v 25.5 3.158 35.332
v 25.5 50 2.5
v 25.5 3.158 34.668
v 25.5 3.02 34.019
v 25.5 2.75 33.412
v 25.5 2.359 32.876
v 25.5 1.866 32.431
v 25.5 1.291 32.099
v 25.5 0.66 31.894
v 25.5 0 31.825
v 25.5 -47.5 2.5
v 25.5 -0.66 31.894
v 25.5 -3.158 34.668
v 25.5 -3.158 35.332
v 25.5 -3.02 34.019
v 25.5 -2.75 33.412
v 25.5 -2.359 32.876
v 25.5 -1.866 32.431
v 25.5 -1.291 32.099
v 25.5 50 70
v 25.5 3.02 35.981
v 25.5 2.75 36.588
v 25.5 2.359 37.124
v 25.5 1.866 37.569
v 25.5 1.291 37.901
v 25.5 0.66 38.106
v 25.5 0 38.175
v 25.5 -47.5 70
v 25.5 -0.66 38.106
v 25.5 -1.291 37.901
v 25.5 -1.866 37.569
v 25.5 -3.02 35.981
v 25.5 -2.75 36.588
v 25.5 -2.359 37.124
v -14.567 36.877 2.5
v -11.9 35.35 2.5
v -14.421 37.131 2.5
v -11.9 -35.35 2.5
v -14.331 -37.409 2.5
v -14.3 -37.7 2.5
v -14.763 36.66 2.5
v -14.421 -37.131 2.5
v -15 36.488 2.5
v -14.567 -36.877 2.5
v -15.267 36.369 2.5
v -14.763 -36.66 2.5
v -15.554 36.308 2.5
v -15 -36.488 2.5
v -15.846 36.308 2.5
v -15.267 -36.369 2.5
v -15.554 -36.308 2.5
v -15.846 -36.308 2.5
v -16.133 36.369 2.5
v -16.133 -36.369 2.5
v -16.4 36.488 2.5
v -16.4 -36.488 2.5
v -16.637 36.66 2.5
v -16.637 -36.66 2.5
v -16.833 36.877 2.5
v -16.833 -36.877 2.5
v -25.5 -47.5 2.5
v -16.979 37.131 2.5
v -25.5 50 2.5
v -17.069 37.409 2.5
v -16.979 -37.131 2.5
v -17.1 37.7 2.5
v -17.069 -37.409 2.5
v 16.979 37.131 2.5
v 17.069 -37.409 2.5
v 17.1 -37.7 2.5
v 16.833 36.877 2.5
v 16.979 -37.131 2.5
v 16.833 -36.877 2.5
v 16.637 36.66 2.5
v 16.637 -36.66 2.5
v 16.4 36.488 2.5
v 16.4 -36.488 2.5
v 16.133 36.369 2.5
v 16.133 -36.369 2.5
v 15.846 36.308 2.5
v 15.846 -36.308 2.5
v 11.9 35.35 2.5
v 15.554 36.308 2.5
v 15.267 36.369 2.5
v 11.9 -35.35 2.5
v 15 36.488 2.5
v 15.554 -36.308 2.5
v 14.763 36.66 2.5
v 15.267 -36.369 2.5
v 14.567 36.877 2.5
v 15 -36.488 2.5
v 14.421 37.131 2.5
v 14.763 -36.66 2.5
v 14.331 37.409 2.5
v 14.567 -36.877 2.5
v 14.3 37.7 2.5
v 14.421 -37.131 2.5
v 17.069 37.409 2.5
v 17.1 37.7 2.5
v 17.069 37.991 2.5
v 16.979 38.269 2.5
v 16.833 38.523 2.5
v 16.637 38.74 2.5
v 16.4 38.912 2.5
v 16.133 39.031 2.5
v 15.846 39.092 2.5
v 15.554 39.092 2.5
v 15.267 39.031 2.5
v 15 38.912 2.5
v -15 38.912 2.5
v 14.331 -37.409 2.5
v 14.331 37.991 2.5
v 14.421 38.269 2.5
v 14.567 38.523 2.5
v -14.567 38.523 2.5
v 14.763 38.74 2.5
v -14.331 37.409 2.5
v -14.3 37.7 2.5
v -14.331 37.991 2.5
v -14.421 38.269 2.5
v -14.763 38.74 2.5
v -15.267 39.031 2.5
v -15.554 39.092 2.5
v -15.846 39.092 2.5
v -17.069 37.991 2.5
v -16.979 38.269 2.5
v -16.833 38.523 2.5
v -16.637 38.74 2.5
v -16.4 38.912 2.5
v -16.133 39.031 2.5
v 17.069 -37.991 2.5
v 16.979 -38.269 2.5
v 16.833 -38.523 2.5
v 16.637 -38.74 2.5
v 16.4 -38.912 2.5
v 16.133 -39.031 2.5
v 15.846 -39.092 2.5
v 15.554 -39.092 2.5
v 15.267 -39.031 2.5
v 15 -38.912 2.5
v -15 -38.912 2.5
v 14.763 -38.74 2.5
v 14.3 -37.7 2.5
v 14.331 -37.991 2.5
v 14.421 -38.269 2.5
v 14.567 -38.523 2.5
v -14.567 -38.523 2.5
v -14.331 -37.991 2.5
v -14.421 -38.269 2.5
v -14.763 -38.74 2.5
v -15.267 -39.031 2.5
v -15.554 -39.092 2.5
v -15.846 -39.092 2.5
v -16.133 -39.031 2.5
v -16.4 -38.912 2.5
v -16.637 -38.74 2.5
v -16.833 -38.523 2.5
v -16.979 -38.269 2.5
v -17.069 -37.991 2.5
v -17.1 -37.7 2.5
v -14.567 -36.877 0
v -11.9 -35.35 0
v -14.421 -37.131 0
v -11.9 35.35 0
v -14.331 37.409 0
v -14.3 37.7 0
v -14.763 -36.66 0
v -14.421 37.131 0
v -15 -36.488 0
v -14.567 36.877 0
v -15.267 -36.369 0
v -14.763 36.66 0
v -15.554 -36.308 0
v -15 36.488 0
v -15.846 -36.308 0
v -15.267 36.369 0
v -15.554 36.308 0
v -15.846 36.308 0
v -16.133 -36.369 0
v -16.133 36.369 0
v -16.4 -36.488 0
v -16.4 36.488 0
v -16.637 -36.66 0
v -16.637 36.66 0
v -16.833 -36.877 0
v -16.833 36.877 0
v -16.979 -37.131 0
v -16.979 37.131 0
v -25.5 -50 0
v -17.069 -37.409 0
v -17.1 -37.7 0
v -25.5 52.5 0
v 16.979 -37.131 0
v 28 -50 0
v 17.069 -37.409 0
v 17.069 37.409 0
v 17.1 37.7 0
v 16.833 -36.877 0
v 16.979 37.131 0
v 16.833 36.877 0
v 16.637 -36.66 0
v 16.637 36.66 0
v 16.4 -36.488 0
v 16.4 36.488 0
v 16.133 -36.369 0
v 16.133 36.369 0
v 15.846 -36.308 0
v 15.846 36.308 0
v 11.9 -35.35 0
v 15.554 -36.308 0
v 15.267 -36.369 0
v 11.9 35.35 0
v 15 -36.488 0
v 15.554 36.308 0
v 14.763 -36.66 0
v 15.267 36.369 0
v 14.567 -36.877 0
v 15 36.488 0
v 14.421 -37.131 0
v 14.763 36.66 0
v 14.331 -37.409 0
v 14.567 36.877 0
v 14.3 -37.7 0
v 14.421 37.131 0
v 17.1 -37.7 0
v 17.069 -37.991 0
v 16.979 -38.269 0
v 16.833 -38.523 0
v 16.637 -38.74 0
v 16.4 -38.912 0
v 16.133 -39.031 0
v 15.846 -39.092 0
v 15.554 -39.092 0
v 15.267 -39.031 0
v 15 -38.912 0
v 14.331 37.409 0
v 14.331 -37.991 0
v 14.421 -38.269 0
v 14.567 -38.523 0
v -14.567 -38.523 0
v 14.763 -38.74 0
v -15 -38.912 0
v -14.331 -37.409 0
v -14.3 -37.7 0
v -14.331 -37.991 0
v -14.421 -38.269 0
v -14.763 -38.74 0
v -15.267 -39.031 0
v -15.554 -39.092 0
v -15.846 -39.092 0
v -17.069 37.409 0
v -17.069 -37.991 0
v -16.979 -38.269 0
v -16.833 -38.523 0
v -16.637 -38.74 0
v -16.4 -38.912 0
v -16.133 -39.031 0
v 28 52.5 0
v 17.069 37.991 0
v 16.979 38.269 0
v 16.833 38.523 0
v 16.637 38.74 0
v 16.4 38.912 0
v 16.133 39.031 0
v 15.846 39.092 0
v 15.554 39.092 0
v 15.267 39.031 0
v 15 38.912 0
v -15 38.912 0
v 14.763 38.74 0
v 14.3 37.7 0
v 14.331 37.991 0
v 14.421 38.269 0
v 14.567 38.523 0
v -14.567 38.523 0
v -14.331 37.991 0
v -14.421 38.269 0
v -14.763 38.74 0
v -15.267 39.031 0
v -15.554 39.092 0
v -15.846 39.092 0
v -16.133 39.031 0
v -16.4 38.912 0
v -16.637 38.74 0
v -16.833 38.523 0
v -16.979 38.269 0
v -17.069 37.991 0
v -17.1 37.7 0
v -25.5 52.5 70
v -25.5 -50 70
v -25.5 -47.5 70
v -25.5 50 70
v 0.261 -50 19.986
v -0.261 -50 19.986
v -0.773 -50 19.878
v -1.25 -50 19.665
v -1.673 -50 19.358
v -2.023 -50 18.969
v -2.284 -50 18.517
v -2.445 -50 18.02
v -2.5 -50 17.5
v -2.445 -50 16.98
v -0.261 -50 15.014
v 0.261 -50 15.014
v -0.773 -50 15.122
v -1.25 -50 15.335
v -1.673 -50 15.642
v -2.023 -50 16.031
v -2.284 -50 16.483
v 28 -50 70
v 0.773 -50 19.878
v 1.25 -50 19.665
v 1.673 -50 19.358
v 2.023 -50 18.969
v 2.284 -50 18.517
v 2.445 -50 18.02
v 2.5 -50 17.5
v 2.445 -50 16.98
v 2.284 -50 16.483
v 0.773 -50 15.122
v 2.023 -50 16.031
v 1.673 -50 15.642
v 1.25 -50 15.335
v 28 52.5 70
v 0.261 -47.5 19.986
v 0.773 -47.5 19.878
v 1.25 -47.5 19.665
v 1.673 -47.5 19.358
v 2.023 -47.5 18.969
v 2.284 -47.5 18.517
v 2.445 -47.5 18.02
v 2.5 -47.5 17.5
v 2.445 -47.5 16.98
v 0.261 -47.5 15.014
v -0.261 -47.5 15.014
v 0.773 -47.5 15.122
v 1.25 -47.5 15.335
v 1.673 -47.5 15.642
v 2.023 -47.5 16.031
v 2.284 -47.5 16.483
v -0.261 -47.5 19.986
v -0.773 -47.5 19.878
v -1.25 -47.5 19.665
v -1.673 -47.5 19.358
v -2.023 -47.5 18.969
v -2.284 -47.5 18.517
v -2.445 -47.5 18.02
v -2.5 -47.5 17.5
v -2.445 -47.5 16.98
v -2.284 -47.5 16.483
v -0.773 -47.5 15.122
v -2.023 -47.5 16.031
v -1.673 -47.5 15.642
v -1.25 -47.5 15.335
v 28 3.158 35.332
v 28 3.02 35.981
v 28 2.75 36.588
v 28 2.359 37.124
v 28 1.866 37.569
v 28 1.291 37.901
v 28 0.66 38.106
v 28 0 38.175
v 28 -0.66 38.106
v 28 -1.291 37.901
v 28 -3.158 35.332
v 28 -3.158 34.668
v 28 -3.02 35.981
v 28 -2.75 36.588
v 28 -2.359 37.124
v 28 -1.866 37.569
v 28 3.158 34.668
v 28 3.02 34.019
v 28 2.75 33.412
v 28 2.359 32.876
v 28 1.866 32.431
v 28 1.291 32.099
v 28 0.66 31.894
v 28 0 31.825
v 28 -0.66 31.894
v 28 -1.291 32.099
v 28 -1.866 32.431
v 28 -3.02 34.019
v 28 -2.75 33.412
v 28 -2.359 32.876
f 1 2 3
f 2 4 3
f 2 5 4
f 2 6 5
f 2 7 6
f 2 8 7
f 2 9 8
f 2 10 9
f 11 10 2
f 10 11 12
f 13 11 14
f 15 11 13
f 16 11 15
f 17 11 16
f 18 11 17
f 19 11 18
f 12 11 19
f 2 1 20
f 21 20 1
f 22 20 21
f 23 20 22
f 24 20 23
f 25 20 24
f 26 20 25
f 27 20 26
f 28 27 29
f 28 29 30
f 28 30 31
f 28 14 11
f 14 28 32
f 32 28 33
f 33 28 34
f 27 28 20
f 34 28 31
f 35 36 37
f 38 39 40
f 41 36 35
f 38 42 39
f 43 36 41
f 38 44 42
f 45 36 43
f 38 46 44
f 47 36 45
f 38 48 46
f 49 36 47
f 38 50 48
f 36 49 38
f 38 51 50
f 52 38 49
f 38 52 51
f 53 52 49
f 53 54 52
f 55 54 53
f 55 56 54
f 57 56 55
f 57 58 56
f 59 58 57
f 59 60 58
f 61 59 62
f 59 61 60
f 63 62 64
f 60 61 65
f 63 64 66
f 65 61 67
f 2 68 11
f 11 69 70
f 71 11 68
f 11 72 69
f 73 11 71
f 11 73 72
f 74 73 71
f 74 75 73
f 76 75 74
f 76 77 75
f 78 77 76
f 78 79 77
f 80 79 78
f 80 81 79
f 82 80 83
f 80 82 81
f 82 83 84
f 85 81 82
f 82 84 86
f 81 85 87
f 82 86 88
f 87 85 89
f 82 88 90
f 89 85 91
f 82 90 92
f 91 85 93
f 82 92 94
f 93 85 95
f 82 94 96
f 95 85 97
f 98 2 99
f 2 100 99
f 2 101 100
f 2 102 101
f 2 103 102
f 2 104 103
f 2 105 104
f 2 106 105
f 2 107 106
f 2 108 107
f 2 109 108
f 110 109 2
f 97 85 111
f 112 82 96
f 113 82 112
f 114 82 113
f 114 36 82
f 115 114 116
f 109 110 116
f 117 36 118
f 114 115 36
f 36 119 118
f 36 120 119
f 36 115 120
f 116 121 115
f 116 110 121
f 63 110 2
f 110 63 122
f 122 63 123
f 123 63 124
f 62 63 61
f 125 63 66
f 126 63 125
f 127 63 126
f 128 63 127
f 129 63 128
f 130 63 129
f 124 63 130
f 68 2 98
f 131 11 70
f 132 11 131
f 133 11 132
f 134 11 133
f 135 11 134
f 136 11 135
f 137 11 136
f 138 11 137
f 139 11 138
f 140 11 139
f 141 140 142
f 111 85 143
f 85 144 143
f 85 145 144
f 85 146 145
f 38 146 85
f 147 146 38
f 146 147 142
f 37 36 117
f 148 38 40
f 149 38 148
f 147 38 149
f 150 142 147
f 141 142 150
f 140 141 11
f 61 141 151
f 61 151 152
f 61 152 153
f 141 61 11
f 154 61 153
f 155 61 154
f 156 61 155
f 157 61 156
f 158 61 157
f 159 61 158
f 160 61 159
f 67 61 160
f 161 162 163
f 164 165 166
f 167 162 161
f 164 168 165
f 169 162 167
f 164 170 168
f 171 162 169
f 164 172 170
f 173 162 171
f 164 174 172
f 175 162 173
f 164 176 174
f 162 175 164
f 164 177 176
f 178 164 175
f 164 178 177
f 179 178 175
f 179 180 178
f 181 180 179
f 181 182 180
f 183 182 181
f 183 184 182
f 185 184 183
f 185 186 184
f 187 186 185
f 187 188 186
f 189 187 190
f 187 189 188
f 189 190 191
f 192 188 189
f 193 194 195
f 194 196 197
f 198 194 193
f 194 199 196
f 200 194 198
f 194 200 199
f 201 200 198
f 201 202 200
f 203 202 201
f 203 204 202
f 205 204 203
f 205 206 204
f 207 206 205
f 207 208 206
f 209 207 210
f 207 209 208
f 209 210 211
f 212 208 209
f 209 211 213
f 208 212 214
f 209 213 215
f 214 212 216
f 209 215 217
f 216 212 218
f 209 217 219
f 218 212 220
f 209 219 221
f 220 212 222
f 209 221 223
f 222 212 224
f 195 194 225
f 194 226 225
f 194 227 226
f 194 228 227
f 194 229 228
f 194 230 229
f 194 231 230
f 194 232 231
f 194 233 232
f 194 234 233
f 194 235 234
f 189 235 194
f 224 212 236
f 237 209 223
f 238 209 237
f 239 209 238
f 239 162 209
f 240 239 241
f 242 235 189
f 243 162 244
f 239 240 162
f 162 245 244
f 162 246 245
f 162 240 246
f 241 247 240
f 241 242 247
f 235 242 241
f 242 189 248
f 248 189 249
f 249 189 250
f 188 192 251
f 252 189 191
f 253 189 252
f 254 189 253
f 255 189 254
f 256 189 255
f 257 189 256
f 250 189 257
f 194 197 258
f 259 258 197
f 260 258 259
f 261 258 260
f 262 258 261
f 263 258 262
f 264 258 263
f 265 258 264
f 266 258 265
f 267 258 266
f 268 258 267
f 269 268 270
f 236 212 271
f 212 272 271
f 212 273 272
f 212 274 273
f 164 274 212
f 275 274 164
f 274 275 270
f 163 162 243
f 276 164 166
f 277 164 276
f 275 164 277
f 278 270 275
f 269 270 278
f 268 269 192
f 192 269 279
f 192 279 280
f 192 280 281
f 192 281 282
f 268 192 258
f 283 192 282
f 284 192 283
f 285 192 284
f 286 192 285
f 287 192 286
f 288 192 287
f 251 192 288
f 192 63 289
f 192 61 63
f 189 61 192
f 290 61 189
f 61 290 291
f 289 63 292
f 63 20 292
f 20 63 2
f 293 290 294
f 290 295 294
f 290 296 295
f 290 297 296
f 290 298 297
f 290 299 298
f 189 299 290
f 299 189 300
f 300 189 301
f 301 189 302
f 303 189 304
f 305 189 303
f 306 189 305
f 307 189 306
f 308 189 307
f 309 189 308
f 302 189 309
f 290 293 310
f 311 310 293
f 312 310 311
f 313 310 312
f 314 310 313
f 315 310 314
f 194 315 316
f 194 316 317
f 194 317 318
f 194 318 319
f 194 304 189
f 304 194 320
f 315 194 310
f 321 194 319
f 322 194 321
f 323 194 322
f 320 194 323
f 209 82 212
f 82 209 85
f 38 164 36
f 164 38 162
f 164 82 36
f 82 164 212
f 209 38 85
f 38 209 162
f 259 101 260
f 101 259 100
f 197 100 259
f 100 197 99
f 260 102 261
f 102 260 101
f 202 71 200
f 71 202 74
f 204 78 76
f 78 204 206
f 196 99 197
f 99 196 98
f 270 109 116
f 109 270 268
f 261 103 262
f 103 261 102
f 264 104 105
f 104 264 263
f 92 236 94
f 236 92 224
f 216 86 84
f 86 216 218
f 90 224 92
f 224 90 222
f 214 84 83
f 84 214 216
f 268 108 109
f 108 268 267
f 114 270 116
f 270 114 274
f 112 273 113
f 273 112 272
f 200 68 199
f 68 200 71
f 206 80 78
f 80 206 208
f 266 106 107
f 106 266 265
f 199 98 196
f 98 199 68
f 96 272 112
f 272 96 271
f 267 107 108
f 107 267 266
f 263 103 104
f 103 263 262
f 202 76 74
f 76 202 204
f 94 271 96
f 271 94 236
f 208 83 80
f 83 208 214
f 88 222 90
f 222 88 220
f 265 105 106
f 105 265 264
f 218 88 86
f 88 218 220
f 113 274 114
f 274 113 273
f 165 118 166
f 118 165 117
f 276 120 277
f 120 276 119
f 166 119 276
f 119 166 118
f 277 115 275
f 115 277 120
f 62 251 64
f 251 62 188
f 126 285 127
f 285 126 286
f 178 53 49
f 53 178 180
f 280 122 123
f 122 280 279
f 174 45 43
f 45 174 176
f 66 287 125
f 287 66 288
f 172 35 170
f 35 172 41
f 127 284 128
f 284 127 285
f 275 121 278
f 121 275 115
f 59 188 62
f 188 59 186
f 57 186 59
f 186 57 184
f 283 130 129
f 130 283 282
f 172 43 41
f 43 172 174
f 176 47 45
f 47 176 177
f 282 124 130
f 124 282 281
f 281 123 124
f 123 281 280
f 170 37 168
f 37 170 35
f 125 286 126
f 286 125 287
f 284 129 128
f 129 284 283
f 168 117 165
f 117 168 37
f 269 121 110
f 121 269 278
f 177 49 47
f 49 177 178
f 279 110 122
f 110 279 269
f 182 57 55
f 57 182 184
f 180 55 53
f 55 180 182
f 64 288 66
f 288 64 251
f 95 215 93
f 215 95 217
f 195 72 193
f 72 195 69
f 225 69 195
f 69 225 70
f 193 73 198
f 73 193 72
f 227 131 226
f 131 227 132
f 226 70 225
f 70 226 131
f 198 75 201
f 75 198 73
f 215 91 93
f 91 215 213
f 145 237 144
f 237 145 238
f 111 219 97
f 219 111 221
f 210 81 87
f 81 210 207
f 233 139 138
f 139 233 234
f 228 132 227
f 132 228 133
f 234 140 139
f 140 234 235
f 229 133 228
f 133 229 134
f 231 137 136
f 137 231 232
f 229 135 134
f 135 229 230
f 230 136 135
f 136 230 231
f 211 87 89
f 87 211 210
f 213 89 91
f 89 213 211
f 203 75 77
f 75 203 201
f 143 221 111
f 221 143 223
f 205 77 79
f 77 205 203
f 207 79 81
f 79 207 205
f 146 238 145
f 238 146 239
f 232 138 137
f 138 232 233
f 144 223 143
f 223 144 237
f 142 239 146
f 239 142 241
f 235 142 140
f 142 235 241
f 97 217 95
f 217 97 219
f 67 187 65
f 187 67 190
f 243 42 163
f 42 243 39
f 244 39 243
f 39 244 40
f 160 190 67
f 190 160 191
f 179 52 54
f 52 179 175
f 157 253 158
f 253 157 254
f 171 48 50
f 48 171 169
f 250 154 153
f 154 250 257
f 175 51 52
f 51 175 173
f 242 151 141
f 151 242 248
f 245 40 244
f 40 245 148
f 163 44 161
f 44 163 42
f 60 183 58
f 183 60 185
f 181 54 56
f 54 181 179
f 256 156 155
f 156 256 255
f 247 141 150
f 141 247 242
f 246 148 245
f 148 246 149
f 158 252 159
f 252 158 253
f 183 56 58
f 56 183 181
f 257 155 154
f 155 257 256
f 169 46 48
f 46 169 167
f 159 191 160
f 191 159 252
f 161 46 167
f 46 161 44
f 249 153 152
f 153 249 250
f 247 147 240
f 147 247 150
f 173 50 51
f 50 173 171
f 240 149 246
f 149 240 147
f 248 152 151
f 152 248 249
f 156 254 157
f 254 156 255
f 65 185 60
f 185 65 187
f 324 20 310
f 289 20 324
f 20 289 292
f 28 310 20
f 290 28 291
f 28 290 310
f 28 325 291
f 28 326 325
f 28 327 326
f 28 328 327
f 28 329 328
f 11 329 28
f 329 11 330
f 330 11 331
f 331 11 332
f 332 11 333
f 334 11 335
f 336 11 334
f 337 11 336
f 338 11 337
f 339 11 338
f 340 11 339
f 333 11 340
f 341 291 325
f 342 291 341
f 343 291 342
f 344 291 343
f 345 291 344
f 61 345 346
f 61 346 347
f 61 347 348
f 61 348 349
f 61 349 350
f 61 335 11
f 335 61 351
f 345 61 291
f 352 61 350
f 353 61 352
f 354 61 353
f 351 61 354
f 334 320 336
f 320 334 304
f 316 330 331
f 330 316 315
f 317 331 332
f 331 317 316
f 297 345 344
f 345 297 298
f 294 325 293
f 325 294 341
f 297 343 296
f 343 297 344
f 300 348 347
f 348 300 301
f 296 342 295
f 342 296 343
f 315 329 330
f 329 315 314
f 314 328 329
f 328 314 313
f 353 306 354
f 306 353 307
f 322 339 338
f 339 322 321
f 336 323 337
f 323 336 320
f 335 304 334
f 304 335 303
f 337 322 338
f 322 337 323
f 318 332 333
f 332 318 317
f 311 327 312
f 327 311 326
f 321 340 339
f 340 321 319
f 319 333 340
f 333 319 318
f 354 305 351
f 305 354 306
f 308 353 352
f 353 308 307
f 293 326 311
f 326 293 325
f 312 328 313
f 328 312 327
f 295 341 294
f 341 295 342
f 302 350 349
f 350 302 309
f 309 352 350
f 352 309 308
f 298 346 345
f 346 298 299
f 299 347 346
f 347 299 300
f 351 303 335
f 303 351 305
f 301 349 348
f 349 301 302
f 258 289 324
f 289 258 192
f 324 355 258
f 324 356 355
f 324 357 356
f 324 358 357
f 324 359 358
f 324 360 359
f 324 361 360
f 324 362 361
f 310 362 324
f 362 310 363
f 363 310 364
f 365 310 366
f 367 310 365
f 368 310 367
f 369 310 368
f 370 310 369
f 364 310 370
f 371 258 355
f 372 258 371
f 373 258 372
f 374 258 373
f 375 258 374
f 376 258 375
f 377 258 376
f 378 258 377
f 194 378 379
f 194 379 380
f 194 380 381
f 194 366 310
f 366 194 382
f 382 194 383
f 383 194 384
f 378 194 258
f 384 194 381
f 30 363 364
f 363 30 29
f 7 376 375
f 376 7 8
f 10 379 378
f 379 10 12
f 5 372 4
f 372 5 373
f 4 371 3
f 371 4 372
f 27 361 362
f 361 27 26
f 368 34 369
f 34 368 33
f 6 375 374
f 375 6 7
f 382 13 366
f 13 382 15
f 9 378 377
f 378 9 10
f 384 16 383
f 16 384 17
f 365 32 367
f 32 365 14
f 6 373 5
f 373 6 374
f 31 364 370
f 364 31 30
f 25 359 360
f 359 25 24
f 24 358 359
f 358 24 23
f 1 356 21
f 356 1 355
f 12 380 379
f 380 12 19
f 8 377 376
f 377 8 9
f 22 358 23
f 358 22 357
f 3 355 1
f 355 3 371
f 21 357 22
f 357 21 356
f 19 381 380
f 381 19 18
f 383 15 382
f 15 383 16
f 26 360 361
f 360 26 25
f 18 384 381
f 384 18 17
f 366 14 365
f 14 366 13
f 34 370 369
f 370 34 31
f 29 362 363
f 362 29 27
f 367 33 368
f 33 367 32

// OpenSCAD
$fn = 30;

mount_hole_y = 75.4/2;
mount_hole_x = 31.4/2;
hole_diameter = 2.8;

tripod_mount_hole = 6.35;

wall_thickness = 2.5;

pcb_height = 36;
pcb_length = 80;

screen_height = 23.8;
screen_length = 70.7;

faceplate_height = pcb_height + 15;
faceplate_length = pcb_length + 20;
box_depth = 70;

union(){
faceplate();
sidewalls();
baseplate();

}

module faceplate(){
	difference(){
		translate([faceplate_height/-2,faceplate_length/-2]){
			difference(){
				cube([faceplate_height,faceplate_length,wall_thickness]);
				translate([(faceplate_height-screen_height)/2,(faceplate_length-screen_length)/2]){
					cube([screen_height,screen_length,wall_thickness]);
				}	
			}
		}
		translate([mount_hole_x,mount_hole_y]){cylinder(wall_thickness, d=hole_diameter, true);}
		translate([-mount_hole_x,mount_hole_y]){cylinder(wall_thickness, d=hole_diameter, true);}
		translate([mount_hole_x,-mount_hole_y]){cylinder(wall_thickness, d=hole_diameter, true);}
		translate([-mount_hole_x,-mount_hole_y]){cylinder(wall_thickness, d=hole_diameter, true);}
	}
}

module sidewalls(){
	difference(){
	translate([faceplate_height/-2,faceplate_length/-2]){
		cube([faceplate_height,wall_thickness, box_depth]);
	}
	translate([0,(faceplate_length/-2)+3,box_depth/4]){
		rotate([90,0,0]){
			cylinder(wall_thickness+2,d=5,true);
		}
	}
	}
	translate([faceplate_height/-2,faceplate_length/2]){
		cube([faceplate_height,wall_thickness, box_depth]);
	}
}

module baseplate(){
	difference(){
		translate([faceplate_height/2,faceplate_length/-2]){
			cube([wall_thickness,faceplate_length+wall_thickness, box_depth]);
		}
translate([(faceplate_height/2)-1,0,box_depth/2]){
		rotate([0,90,0]){
			cylinder(wall_thickness+2,d=tripod_mount_hole,true);}
		}
	}
	
}
